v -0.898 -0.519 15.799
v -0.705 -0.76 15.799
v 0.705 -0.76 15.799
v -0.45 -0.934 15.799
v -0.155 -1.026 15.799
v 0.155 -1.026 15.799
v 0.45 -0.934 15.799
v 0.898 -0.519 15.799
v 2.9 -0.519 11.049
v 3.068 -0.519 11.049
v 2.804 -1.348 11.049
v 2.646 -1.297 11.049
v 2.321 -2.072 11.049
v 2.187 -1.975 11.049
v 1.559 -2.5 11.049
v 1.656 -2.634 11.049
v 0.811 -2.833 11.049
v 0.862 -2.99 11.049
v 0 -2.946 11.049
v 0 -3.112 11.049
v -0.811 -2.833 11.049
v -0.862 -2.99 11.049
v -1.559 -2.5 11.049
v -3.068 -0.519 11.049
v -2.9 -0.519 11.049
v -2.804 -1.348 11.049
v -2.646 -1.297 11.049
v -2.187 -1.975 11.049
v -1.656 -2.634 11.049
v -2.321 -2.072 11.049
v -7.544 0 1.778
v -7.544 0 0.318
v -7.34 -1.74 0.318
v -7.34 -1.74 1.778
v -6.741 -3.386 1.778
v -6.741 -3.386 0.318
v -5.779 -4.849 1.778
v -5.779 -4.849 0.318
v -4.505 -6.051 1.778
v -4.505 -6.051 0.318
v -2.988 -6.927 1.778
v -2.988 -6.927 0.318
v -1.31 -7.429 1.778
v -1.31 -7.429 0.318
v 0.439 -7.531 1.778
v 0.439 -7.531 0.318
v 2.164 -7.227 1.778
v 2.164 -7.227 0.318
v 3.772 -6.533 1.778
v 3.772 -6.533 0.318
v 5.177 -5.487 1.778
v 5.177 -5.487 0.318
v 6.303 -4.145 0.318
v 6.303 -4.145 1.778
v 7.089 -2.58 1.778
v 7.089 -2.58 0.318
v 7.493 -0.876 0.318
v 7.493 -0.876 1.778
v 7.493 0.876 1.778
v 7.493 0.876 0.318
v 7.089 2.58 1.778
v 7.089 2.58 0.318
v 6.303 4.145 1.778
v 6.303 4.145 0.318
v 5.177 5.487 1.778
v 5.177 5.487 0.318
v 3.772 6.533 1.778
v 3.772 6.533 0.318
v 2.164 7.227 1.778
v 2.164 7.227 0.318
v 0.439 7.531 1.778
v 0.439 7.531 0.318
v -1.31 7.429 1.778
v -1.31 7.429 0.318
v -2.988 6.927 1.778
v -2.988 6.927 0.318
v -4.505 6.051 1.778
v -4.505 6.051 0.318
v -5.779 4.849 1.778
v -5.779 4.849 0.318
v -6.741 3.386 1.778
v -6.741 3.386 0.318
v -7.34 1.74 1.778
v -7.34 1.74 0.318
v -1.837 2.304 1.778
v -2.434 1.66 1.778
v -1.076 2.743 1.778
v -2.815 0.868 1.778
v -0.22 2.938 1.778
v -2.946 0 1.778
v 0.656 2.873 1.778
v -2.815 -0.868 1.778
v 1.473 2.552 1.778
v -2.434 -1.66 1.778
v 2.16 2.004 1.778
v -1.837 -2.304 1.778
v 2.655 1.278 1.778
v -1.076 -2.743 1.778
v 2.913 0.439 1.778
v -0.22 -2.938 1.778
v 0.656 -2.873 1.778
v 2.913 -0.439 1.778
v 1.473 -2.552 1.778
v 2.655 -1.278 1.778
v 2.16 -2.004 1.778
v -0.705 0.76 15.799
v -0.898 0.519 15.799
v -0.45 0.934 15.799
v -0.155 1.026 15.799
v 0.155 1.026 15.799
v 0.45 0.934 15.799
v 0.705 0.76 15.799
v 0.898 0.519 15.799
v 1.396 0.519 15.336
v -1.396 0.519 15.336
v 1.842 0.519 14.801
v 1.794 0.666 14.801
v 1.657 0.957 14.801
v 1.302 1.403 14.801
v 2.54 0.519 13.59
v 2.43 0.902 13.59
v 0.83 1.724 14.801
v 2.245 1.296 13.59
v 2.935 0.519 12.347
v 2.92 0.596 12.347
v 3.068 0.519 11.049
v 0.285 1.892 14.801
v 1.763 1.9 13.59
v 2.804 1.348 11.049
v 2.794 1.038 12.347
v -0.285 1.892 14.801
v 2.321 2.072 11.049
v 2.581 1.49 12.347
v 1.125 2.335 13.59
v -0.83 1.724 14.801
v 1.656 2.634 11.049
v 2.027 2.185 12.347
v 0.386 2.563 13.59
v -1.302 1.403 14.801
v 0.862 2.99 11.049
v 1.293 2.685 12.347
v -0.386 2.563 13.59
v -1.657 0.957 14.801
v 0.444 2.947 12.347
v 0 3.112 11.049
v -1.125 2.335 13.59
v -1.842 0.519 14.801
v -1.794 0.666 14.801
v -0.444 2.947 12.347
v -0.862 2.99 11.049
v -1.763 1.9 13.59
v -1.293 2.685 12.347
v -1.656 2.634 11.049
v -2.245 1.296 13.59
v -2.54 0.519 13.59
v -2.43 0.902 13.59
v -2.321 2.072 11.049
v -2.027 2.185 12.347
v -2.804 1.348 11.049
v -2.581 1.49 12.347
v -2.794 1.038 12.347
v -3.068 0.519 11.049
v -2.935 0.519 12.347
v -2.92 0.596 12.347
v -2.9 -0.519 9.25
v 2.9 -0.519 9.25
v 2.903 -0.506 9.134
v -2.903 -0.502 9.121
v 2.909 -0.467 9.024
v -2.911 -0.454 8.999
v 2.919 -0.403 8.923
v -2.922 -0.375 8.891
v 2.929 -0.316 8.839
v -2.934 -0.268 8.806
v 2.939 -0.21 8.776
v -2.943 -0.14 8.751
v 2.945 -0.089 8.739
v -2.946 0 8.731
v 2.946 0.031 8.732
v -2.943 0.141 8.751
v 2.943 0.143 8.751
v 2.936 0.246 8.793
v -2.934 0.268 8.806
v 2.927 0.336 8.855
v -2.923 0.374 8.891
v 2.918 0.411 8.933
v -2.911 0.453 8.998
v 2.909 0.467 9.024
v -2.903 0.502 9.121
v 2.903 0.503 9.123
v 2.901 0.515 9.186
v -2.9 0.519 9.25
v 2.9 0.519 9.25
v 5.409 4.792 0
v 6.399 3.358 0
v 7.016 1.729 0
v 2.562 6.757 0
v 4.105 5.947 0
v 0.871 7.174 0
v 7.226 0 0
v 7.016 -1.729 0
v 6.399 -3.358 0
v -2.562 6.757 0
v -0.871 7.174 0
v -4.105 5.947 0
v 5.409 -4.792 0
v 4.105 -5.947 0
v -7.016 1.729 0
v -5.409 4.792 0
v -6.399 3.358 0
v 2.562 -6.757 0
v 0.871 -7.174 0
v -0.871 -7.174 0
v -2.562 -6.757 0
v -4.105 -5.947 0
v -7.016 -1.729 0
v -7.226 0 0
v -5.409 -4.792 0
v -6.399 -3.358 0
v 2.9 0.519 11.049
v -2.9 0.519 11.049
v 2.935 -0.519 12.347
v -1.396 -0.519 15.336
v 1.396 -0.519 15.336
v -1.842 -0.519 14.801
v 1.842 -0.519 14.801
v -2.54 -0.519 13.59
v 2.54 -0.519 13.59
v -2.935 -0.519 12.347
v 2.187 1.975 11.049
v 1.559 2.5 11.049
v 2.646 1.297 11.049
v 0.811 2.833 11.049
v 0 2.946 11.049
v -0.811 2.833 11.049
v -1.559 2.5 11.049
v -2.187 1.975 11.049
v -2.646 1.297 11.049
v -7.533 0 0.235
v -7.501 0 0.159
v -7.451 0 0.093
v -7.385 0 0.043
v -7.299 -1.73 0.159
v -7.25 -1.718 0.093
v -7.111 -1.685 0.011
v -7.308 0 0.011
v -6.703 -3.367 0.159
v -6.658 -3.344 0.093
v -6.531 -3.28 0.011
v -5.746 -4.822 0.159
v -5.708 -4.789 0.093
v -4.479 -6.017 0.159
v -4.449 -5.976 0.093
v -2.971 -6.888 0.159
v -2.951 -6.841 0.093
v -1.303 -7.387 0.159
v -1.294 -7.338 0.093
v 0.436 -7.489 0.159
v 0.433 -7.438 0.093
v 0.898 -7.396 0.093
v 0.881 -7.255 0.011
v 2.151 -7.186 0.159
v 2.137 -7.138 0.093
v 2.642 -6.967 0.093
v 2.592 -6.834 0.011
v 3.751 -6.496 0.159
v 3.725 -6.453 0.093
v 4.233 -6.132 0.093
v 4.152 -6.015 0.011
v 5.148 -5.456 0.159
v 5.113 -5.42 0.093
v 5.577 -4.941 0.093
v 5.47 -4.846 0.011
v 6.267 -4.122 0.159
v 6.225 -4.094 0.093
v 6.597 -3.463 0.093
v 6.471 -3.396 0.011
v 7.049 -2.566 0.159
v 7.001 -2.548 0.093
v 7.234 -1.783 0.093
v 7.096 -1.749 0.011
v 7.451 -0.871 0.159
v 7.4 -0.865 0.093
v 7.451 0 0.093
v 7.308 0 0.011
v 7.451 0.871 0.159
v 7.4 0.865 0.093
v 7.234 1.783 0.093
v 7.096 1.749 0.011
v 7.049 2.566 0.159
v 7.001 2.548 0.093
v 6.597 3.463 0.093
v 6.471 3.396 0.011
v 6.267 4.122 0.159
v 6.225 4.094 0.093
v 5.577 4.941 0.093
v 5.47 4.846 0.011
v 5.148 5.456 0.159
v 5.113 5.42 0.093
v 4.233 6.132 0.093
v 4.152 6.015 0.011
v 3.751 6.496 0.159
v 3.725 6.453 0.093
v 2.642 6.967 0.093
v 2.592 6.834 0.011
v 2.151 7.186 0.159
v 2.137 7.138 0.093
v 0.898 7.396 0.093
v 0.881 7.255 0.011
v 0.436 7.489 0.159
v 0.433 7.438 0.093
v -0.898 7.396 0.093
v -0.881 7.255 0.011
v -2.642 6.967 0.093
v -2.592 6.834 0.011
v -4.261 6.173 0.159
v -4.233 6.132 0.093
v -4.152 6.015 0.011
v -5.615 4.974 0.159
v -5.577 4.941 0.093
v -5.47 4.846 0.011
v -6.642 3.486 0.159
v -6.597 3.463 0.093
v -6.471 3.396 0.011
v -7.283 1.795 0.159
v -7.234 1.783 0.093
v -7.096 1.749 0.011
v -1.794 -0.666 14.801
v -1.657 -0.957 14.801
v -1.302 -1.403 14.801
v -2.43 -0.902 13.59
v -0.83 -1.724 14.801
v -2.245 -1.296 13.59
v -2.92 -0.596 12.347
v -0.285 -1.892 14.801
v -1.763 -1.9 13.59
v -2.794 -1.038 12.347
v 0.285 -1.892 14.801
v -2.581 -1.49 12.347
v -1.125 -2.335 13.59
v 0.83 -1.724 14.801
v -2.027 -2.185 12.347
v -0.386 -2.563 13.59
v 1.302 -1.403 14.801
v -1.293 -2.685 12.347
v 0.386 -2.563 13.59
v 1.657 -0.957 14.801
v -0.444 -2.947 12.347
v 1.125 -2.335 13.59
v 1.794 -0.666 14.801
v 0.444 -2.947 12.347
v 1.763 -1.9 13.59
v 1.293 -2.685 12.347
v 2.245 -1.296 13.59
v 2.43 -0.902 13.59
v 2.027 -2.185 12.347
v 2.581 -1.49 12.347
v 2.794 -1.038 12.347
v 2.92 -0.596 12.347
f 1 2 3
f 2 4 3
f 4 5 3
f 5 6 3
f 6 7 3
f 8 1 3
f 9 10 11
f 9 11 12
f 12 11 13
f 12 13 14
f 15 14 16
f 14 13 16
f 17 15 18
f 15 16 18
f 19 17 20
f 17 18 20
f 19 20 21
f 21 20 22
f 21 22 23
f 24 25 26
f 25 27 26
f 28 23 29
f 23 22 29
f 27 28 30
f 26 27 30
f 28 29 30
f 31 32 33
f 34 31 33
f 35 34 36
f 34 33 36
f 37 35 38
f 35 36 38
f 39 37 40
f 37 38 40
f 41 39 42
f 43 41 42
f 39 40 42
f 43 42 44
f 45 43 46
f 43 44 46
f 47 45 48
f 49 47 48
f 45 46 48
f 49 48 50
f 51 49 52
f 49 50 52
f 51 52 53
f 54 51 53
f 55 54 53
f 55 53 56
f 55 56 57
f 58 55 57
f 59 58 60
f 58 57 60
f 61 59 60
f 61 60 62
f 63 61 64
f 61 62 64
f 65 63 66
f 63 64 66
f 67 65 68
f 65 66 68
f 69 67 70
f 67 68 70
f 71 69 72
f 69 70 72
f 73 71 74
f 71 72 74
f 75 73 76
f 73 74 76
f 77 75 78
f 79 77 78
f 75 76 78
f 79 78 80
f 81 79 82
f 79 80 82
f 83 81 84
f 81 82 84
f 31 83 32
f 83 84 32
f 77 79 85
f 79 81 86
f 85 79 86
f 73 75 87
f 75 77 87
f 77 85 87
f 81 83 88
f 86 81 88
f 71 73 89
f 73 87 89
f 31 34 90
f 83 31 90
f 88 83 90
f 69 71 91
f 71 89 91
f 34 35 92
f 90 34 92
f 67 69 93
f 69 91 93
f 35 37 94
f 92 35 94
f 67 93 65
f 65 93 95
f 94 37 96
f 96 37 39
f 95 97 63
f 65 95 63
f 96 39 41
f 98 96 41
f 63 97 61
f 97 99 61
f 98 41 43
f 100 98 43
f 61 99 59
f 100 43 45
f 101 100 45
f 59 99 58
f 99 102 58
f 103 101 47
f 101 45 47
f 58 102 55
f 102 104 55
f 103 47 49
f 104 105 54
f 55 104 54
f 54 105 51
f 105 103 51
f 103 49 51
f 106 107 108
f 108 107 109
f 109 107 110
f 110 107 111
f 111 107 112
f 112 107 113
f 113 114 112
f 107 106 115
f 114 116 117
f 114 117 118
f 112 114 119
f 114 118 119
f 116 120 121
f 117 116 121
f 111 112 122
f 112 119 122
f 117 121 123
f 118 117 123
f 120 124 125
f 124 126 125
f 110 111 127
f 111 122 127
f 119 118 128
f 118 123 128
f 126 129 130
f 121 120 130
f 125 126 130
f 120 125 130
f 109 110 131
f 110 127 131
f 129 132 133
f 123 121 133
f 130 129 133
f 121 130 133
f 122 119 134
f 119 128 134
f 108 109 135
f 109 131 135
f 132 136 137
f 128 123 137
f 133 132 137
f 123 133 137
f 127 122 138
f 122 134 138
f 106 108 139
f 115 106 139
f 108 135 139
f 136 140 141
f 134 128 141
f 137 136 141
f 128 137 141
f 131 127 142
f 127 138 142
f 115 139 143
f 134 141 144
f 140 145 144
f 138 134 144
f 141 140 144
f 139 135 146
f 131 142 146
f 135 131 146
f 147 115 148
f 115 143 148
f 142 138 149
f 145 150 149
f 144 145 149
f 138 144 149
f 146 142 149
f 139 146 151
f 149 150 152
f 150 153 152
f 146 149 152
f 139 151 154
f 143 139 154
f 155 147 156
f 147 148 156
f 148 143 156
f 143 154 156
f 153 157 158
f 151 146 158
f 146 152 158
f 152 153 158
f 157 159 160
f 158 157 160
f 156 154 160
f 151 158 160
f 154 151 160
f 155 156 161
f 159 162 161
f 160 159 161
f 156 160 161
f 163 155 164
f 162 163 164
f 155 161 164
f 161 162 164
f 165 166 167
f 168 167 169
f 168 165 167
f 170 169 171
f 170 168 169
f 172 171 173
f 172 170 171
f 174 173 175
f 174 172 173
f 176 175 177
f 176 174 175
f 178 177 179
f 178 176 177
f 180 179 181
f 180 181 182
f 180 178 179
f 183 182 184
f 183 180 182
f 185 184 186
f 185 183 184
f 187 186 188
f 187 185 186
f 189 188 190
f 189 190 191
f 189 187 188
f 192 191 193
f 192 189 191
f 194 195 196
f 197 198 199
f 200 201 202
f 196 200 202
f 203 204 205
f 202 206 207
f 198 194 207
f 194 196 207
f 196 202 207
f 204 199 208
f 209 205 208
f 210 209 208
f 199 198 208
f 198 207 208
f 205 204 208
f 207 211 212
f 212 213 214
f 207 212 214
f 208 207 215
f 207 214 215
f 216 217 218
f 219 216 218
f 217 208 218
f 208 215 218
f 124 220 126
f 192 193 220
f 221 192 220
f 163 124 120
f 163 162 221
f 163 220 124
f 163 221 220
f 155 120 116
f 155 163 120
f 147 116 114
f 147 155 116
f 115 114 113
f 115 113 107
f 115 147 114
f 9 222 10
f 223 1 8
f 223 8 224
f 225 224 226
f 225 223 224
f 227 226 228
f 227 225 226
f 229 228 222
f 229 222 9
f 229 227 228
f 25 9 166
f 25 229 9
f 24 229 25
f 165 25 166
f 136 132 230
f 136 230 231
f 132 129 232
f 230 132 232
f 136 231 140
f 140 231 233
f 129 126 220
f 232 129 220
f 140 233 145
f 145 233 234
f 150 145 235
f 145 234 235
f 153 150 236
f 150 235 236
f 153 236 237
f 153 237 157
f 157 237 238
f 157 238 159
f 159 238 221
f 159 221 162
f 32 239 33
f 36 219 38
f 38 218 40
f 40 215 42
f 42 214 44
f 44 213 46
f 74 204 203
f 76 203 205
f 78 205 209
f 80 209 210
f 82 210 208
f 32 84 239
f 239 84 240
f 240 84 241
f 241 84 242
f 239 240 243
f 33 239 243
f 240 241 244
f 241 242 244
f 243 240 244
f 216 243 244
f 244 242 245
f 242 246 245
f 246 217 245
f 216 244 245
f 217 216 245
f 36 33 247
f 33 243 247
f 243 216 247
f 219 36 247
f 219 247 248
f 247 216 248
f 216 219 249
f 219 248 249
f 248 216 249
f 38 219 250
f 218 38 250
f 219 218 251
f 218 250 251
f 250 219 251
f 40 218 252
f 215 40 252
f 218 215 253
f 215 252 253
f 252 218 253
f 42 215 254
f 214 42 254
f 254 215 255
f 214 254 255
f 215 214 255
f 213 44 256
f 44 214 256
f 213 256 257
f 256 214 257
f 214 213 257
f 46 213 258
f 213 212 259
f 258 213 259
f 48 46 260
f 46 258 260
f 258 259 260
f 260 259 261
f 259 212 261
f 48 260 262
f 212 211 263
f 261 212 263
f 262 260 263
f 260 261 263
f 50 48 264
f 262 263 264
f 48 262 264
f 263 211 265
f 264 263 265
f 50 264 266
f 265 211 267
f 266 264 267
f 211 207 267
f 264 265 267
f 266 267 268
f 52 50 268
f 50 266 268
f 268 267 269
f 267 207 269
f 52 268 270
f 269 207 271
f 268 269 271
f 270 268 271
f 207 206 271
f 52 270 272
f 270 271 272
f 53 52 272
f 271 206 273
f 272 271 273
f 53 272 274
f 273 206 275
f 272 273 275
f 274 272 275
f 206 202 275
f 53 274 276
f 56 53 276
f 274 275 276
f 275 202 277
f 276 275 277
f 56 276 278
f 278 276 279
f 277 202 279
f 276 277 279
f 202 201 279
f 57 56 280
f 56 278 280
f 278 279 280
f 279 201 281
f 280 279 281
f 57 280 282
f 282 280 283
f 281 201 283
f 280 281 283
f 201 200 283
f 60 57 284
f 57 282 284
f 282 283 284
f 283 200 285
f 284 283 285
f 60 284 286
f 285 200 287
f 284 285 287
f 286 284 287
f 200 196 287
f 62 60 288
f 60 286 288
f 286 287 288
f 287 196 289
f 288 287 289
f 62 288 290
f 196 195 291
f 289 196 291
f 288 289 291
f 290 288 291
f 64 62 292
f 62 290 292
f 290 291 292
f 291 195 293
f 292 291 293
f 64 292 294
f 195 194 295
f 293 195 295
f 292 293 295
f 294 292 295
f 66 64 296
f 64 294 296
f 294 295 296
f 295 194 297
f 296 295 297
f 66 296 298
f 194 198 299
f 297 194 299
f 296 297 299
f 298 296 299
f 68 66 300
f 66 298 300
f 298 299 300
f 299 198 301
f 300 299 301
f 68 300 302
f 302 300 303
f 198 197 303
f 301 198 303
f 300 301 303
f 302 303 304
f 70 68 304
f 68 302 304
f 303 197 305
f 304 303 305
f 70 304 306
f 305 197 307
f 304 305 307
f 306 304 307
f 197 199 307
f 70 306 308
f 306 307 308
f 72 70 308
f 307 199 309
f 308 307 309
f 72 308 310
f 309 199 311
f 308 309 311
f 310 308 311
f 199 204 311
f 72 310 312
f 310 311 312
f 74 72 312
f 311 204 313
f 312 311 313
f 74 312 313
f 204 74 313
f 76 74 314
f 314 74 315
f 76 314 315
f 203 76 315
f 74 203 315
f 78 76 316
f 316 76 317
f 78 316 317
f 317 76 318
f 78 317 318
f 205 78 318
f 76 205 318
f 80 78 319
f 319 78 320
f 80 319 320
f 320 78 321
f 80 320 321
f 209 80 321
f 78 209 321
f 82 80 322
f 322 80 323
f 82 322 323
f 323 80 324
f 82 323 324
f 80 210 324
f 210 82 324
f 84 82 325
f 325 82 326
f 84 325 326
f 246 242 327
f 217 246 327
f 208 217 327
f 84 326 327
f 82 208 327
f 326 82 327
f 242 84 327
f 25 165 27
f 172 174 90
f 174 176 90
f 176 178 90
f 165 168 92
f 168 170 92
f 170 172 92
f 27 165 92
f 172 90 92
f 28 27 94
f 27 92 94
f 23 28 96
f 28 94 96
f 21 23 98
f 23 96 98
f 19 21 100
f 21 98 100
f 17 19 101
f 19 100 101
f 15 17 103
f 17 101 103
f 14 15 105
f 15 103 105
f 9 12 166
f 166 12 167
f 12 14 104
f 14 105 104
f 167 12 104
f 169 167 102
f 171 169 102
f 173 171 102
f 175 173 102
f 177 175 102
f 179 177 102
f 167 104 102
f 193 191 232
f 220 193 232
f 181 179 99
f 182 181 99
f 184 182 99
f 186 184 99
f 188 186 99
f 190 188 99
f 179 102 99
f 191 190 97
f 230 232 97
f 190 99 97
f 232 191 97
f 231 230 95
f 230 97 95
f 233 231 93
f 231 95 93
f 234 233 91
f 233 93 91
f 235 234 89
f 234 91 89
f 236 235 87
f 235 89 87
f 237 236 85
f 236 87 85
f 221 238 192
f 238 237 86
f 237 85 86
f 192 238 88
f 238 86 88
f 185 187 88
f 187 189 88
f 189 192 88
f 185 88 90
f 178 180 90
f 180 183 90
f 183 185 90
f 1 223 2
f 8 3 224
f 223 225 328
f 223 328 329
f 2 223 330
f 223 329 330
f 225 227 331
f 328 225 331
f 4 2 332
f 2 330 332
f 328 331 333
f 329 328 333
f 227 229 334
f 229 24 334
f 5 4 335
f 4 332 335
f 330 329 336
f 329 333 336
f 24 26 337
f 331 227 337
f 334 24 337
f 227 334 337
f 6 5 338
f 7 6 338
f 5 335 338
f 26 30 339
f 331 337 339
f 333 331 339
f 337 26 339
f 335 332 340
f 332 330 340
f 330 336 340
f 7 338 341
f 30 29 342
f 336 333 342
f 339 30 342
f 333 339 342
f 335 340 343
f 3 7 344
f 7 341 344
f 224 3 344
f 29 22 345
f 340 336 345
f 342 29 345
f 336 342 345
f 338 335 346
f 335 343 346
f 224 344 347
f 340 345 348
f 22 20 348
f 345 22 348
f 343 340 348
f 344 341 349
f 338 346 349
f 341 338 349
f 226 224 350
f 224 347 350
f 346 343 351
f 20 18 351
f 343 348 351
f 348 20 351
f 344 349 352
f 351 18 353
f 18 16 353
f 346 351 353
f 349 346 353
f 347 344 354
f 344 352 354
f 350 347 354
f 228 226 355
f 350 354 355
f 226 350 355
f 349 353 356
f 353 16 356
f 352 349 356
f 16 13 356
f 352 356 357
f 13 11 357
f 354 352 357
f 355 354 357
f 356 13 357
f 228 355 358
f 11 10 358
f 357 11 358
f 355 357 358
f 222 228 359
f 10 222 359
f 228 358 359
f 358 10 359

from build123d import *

# Parameters (mm, degrees)
SLOT_DEPTH      = 20.063575779
SLOT_DEPTH_BACK = 20.063575779
FILLET1_R       = 0.3175


with BuildPart() as part:
    # Sketch2 → Revolve1 (revolve)
    with BuildSketch(Plane(origin=(0, 0, 0), x_dir=(0, 0, -1), z_dir=(1, 0, 0)), mode=Mode.PRIVATE) as revolve1_sk:
        with BuildLine():
            Line((0, 0), (-15.7988, 0))
            Line((-15.7988, 0), (-15.7988, 1.037166667))
            ThreePointArc((-15.7988, 1.037166667), (-13.640498544, 2.570299796), (-11.049, 3.1115))
            Line((-11.049, 3.1115), (-11.049, 2.9464))
            Line((-11.049, 2.9464), (-1.778, 2.9464))
            Line((-1.778, 2.9464), (-1.778, 7.5438))
            Line((-1.778, 7.5438), (0, 7.5438))
            Line((0, 7.5438), (0, 0))
        make_face()
    revolve(revolve1_sk.sketch.rotate(Axis((0, 0, 0), (0, 0, 1)), 90), axis=Axis((0, 0, 0), (0, 0, 1)))

    # Sketch3 → Slot (cut, two sides: drawn at the far end of the back side and taken through both)
    with BuildSketch(Plane(origin=(0, 0, 0), x_dir=(0, 0, -1), z_dir=(1, 0, 0)).offset(-SLOT_DEPTH_BACK)):
        with BuildLine():
            Line((-9.249833333, 0.518583333), (-15.7988, 0.518583333))
            Line((-15.7988, 0.518583333), (-15.7988, -0.518583333))
            Line((-15.7988, -0.518583333), (-9.249833333, -0.518583333))
            ThreePointArc((-9.249833333, -0.518583333), (-8.73125, 0), (-9.249833333, 0.518583333))
        make_face()
    extrude(amount=SLOT_DEPTH + SLOT_DEPTH_BACK, mode=Mode.SUBTRACT)

    # Fillet1
    fillet1_edges = [part.edges().sort_by_distance(p)[0] for p in [
        (7.5438, 0, 0),
    ]]
    fillet(fillet1_edges, radius=FILLET1_R)


solid = part.part
